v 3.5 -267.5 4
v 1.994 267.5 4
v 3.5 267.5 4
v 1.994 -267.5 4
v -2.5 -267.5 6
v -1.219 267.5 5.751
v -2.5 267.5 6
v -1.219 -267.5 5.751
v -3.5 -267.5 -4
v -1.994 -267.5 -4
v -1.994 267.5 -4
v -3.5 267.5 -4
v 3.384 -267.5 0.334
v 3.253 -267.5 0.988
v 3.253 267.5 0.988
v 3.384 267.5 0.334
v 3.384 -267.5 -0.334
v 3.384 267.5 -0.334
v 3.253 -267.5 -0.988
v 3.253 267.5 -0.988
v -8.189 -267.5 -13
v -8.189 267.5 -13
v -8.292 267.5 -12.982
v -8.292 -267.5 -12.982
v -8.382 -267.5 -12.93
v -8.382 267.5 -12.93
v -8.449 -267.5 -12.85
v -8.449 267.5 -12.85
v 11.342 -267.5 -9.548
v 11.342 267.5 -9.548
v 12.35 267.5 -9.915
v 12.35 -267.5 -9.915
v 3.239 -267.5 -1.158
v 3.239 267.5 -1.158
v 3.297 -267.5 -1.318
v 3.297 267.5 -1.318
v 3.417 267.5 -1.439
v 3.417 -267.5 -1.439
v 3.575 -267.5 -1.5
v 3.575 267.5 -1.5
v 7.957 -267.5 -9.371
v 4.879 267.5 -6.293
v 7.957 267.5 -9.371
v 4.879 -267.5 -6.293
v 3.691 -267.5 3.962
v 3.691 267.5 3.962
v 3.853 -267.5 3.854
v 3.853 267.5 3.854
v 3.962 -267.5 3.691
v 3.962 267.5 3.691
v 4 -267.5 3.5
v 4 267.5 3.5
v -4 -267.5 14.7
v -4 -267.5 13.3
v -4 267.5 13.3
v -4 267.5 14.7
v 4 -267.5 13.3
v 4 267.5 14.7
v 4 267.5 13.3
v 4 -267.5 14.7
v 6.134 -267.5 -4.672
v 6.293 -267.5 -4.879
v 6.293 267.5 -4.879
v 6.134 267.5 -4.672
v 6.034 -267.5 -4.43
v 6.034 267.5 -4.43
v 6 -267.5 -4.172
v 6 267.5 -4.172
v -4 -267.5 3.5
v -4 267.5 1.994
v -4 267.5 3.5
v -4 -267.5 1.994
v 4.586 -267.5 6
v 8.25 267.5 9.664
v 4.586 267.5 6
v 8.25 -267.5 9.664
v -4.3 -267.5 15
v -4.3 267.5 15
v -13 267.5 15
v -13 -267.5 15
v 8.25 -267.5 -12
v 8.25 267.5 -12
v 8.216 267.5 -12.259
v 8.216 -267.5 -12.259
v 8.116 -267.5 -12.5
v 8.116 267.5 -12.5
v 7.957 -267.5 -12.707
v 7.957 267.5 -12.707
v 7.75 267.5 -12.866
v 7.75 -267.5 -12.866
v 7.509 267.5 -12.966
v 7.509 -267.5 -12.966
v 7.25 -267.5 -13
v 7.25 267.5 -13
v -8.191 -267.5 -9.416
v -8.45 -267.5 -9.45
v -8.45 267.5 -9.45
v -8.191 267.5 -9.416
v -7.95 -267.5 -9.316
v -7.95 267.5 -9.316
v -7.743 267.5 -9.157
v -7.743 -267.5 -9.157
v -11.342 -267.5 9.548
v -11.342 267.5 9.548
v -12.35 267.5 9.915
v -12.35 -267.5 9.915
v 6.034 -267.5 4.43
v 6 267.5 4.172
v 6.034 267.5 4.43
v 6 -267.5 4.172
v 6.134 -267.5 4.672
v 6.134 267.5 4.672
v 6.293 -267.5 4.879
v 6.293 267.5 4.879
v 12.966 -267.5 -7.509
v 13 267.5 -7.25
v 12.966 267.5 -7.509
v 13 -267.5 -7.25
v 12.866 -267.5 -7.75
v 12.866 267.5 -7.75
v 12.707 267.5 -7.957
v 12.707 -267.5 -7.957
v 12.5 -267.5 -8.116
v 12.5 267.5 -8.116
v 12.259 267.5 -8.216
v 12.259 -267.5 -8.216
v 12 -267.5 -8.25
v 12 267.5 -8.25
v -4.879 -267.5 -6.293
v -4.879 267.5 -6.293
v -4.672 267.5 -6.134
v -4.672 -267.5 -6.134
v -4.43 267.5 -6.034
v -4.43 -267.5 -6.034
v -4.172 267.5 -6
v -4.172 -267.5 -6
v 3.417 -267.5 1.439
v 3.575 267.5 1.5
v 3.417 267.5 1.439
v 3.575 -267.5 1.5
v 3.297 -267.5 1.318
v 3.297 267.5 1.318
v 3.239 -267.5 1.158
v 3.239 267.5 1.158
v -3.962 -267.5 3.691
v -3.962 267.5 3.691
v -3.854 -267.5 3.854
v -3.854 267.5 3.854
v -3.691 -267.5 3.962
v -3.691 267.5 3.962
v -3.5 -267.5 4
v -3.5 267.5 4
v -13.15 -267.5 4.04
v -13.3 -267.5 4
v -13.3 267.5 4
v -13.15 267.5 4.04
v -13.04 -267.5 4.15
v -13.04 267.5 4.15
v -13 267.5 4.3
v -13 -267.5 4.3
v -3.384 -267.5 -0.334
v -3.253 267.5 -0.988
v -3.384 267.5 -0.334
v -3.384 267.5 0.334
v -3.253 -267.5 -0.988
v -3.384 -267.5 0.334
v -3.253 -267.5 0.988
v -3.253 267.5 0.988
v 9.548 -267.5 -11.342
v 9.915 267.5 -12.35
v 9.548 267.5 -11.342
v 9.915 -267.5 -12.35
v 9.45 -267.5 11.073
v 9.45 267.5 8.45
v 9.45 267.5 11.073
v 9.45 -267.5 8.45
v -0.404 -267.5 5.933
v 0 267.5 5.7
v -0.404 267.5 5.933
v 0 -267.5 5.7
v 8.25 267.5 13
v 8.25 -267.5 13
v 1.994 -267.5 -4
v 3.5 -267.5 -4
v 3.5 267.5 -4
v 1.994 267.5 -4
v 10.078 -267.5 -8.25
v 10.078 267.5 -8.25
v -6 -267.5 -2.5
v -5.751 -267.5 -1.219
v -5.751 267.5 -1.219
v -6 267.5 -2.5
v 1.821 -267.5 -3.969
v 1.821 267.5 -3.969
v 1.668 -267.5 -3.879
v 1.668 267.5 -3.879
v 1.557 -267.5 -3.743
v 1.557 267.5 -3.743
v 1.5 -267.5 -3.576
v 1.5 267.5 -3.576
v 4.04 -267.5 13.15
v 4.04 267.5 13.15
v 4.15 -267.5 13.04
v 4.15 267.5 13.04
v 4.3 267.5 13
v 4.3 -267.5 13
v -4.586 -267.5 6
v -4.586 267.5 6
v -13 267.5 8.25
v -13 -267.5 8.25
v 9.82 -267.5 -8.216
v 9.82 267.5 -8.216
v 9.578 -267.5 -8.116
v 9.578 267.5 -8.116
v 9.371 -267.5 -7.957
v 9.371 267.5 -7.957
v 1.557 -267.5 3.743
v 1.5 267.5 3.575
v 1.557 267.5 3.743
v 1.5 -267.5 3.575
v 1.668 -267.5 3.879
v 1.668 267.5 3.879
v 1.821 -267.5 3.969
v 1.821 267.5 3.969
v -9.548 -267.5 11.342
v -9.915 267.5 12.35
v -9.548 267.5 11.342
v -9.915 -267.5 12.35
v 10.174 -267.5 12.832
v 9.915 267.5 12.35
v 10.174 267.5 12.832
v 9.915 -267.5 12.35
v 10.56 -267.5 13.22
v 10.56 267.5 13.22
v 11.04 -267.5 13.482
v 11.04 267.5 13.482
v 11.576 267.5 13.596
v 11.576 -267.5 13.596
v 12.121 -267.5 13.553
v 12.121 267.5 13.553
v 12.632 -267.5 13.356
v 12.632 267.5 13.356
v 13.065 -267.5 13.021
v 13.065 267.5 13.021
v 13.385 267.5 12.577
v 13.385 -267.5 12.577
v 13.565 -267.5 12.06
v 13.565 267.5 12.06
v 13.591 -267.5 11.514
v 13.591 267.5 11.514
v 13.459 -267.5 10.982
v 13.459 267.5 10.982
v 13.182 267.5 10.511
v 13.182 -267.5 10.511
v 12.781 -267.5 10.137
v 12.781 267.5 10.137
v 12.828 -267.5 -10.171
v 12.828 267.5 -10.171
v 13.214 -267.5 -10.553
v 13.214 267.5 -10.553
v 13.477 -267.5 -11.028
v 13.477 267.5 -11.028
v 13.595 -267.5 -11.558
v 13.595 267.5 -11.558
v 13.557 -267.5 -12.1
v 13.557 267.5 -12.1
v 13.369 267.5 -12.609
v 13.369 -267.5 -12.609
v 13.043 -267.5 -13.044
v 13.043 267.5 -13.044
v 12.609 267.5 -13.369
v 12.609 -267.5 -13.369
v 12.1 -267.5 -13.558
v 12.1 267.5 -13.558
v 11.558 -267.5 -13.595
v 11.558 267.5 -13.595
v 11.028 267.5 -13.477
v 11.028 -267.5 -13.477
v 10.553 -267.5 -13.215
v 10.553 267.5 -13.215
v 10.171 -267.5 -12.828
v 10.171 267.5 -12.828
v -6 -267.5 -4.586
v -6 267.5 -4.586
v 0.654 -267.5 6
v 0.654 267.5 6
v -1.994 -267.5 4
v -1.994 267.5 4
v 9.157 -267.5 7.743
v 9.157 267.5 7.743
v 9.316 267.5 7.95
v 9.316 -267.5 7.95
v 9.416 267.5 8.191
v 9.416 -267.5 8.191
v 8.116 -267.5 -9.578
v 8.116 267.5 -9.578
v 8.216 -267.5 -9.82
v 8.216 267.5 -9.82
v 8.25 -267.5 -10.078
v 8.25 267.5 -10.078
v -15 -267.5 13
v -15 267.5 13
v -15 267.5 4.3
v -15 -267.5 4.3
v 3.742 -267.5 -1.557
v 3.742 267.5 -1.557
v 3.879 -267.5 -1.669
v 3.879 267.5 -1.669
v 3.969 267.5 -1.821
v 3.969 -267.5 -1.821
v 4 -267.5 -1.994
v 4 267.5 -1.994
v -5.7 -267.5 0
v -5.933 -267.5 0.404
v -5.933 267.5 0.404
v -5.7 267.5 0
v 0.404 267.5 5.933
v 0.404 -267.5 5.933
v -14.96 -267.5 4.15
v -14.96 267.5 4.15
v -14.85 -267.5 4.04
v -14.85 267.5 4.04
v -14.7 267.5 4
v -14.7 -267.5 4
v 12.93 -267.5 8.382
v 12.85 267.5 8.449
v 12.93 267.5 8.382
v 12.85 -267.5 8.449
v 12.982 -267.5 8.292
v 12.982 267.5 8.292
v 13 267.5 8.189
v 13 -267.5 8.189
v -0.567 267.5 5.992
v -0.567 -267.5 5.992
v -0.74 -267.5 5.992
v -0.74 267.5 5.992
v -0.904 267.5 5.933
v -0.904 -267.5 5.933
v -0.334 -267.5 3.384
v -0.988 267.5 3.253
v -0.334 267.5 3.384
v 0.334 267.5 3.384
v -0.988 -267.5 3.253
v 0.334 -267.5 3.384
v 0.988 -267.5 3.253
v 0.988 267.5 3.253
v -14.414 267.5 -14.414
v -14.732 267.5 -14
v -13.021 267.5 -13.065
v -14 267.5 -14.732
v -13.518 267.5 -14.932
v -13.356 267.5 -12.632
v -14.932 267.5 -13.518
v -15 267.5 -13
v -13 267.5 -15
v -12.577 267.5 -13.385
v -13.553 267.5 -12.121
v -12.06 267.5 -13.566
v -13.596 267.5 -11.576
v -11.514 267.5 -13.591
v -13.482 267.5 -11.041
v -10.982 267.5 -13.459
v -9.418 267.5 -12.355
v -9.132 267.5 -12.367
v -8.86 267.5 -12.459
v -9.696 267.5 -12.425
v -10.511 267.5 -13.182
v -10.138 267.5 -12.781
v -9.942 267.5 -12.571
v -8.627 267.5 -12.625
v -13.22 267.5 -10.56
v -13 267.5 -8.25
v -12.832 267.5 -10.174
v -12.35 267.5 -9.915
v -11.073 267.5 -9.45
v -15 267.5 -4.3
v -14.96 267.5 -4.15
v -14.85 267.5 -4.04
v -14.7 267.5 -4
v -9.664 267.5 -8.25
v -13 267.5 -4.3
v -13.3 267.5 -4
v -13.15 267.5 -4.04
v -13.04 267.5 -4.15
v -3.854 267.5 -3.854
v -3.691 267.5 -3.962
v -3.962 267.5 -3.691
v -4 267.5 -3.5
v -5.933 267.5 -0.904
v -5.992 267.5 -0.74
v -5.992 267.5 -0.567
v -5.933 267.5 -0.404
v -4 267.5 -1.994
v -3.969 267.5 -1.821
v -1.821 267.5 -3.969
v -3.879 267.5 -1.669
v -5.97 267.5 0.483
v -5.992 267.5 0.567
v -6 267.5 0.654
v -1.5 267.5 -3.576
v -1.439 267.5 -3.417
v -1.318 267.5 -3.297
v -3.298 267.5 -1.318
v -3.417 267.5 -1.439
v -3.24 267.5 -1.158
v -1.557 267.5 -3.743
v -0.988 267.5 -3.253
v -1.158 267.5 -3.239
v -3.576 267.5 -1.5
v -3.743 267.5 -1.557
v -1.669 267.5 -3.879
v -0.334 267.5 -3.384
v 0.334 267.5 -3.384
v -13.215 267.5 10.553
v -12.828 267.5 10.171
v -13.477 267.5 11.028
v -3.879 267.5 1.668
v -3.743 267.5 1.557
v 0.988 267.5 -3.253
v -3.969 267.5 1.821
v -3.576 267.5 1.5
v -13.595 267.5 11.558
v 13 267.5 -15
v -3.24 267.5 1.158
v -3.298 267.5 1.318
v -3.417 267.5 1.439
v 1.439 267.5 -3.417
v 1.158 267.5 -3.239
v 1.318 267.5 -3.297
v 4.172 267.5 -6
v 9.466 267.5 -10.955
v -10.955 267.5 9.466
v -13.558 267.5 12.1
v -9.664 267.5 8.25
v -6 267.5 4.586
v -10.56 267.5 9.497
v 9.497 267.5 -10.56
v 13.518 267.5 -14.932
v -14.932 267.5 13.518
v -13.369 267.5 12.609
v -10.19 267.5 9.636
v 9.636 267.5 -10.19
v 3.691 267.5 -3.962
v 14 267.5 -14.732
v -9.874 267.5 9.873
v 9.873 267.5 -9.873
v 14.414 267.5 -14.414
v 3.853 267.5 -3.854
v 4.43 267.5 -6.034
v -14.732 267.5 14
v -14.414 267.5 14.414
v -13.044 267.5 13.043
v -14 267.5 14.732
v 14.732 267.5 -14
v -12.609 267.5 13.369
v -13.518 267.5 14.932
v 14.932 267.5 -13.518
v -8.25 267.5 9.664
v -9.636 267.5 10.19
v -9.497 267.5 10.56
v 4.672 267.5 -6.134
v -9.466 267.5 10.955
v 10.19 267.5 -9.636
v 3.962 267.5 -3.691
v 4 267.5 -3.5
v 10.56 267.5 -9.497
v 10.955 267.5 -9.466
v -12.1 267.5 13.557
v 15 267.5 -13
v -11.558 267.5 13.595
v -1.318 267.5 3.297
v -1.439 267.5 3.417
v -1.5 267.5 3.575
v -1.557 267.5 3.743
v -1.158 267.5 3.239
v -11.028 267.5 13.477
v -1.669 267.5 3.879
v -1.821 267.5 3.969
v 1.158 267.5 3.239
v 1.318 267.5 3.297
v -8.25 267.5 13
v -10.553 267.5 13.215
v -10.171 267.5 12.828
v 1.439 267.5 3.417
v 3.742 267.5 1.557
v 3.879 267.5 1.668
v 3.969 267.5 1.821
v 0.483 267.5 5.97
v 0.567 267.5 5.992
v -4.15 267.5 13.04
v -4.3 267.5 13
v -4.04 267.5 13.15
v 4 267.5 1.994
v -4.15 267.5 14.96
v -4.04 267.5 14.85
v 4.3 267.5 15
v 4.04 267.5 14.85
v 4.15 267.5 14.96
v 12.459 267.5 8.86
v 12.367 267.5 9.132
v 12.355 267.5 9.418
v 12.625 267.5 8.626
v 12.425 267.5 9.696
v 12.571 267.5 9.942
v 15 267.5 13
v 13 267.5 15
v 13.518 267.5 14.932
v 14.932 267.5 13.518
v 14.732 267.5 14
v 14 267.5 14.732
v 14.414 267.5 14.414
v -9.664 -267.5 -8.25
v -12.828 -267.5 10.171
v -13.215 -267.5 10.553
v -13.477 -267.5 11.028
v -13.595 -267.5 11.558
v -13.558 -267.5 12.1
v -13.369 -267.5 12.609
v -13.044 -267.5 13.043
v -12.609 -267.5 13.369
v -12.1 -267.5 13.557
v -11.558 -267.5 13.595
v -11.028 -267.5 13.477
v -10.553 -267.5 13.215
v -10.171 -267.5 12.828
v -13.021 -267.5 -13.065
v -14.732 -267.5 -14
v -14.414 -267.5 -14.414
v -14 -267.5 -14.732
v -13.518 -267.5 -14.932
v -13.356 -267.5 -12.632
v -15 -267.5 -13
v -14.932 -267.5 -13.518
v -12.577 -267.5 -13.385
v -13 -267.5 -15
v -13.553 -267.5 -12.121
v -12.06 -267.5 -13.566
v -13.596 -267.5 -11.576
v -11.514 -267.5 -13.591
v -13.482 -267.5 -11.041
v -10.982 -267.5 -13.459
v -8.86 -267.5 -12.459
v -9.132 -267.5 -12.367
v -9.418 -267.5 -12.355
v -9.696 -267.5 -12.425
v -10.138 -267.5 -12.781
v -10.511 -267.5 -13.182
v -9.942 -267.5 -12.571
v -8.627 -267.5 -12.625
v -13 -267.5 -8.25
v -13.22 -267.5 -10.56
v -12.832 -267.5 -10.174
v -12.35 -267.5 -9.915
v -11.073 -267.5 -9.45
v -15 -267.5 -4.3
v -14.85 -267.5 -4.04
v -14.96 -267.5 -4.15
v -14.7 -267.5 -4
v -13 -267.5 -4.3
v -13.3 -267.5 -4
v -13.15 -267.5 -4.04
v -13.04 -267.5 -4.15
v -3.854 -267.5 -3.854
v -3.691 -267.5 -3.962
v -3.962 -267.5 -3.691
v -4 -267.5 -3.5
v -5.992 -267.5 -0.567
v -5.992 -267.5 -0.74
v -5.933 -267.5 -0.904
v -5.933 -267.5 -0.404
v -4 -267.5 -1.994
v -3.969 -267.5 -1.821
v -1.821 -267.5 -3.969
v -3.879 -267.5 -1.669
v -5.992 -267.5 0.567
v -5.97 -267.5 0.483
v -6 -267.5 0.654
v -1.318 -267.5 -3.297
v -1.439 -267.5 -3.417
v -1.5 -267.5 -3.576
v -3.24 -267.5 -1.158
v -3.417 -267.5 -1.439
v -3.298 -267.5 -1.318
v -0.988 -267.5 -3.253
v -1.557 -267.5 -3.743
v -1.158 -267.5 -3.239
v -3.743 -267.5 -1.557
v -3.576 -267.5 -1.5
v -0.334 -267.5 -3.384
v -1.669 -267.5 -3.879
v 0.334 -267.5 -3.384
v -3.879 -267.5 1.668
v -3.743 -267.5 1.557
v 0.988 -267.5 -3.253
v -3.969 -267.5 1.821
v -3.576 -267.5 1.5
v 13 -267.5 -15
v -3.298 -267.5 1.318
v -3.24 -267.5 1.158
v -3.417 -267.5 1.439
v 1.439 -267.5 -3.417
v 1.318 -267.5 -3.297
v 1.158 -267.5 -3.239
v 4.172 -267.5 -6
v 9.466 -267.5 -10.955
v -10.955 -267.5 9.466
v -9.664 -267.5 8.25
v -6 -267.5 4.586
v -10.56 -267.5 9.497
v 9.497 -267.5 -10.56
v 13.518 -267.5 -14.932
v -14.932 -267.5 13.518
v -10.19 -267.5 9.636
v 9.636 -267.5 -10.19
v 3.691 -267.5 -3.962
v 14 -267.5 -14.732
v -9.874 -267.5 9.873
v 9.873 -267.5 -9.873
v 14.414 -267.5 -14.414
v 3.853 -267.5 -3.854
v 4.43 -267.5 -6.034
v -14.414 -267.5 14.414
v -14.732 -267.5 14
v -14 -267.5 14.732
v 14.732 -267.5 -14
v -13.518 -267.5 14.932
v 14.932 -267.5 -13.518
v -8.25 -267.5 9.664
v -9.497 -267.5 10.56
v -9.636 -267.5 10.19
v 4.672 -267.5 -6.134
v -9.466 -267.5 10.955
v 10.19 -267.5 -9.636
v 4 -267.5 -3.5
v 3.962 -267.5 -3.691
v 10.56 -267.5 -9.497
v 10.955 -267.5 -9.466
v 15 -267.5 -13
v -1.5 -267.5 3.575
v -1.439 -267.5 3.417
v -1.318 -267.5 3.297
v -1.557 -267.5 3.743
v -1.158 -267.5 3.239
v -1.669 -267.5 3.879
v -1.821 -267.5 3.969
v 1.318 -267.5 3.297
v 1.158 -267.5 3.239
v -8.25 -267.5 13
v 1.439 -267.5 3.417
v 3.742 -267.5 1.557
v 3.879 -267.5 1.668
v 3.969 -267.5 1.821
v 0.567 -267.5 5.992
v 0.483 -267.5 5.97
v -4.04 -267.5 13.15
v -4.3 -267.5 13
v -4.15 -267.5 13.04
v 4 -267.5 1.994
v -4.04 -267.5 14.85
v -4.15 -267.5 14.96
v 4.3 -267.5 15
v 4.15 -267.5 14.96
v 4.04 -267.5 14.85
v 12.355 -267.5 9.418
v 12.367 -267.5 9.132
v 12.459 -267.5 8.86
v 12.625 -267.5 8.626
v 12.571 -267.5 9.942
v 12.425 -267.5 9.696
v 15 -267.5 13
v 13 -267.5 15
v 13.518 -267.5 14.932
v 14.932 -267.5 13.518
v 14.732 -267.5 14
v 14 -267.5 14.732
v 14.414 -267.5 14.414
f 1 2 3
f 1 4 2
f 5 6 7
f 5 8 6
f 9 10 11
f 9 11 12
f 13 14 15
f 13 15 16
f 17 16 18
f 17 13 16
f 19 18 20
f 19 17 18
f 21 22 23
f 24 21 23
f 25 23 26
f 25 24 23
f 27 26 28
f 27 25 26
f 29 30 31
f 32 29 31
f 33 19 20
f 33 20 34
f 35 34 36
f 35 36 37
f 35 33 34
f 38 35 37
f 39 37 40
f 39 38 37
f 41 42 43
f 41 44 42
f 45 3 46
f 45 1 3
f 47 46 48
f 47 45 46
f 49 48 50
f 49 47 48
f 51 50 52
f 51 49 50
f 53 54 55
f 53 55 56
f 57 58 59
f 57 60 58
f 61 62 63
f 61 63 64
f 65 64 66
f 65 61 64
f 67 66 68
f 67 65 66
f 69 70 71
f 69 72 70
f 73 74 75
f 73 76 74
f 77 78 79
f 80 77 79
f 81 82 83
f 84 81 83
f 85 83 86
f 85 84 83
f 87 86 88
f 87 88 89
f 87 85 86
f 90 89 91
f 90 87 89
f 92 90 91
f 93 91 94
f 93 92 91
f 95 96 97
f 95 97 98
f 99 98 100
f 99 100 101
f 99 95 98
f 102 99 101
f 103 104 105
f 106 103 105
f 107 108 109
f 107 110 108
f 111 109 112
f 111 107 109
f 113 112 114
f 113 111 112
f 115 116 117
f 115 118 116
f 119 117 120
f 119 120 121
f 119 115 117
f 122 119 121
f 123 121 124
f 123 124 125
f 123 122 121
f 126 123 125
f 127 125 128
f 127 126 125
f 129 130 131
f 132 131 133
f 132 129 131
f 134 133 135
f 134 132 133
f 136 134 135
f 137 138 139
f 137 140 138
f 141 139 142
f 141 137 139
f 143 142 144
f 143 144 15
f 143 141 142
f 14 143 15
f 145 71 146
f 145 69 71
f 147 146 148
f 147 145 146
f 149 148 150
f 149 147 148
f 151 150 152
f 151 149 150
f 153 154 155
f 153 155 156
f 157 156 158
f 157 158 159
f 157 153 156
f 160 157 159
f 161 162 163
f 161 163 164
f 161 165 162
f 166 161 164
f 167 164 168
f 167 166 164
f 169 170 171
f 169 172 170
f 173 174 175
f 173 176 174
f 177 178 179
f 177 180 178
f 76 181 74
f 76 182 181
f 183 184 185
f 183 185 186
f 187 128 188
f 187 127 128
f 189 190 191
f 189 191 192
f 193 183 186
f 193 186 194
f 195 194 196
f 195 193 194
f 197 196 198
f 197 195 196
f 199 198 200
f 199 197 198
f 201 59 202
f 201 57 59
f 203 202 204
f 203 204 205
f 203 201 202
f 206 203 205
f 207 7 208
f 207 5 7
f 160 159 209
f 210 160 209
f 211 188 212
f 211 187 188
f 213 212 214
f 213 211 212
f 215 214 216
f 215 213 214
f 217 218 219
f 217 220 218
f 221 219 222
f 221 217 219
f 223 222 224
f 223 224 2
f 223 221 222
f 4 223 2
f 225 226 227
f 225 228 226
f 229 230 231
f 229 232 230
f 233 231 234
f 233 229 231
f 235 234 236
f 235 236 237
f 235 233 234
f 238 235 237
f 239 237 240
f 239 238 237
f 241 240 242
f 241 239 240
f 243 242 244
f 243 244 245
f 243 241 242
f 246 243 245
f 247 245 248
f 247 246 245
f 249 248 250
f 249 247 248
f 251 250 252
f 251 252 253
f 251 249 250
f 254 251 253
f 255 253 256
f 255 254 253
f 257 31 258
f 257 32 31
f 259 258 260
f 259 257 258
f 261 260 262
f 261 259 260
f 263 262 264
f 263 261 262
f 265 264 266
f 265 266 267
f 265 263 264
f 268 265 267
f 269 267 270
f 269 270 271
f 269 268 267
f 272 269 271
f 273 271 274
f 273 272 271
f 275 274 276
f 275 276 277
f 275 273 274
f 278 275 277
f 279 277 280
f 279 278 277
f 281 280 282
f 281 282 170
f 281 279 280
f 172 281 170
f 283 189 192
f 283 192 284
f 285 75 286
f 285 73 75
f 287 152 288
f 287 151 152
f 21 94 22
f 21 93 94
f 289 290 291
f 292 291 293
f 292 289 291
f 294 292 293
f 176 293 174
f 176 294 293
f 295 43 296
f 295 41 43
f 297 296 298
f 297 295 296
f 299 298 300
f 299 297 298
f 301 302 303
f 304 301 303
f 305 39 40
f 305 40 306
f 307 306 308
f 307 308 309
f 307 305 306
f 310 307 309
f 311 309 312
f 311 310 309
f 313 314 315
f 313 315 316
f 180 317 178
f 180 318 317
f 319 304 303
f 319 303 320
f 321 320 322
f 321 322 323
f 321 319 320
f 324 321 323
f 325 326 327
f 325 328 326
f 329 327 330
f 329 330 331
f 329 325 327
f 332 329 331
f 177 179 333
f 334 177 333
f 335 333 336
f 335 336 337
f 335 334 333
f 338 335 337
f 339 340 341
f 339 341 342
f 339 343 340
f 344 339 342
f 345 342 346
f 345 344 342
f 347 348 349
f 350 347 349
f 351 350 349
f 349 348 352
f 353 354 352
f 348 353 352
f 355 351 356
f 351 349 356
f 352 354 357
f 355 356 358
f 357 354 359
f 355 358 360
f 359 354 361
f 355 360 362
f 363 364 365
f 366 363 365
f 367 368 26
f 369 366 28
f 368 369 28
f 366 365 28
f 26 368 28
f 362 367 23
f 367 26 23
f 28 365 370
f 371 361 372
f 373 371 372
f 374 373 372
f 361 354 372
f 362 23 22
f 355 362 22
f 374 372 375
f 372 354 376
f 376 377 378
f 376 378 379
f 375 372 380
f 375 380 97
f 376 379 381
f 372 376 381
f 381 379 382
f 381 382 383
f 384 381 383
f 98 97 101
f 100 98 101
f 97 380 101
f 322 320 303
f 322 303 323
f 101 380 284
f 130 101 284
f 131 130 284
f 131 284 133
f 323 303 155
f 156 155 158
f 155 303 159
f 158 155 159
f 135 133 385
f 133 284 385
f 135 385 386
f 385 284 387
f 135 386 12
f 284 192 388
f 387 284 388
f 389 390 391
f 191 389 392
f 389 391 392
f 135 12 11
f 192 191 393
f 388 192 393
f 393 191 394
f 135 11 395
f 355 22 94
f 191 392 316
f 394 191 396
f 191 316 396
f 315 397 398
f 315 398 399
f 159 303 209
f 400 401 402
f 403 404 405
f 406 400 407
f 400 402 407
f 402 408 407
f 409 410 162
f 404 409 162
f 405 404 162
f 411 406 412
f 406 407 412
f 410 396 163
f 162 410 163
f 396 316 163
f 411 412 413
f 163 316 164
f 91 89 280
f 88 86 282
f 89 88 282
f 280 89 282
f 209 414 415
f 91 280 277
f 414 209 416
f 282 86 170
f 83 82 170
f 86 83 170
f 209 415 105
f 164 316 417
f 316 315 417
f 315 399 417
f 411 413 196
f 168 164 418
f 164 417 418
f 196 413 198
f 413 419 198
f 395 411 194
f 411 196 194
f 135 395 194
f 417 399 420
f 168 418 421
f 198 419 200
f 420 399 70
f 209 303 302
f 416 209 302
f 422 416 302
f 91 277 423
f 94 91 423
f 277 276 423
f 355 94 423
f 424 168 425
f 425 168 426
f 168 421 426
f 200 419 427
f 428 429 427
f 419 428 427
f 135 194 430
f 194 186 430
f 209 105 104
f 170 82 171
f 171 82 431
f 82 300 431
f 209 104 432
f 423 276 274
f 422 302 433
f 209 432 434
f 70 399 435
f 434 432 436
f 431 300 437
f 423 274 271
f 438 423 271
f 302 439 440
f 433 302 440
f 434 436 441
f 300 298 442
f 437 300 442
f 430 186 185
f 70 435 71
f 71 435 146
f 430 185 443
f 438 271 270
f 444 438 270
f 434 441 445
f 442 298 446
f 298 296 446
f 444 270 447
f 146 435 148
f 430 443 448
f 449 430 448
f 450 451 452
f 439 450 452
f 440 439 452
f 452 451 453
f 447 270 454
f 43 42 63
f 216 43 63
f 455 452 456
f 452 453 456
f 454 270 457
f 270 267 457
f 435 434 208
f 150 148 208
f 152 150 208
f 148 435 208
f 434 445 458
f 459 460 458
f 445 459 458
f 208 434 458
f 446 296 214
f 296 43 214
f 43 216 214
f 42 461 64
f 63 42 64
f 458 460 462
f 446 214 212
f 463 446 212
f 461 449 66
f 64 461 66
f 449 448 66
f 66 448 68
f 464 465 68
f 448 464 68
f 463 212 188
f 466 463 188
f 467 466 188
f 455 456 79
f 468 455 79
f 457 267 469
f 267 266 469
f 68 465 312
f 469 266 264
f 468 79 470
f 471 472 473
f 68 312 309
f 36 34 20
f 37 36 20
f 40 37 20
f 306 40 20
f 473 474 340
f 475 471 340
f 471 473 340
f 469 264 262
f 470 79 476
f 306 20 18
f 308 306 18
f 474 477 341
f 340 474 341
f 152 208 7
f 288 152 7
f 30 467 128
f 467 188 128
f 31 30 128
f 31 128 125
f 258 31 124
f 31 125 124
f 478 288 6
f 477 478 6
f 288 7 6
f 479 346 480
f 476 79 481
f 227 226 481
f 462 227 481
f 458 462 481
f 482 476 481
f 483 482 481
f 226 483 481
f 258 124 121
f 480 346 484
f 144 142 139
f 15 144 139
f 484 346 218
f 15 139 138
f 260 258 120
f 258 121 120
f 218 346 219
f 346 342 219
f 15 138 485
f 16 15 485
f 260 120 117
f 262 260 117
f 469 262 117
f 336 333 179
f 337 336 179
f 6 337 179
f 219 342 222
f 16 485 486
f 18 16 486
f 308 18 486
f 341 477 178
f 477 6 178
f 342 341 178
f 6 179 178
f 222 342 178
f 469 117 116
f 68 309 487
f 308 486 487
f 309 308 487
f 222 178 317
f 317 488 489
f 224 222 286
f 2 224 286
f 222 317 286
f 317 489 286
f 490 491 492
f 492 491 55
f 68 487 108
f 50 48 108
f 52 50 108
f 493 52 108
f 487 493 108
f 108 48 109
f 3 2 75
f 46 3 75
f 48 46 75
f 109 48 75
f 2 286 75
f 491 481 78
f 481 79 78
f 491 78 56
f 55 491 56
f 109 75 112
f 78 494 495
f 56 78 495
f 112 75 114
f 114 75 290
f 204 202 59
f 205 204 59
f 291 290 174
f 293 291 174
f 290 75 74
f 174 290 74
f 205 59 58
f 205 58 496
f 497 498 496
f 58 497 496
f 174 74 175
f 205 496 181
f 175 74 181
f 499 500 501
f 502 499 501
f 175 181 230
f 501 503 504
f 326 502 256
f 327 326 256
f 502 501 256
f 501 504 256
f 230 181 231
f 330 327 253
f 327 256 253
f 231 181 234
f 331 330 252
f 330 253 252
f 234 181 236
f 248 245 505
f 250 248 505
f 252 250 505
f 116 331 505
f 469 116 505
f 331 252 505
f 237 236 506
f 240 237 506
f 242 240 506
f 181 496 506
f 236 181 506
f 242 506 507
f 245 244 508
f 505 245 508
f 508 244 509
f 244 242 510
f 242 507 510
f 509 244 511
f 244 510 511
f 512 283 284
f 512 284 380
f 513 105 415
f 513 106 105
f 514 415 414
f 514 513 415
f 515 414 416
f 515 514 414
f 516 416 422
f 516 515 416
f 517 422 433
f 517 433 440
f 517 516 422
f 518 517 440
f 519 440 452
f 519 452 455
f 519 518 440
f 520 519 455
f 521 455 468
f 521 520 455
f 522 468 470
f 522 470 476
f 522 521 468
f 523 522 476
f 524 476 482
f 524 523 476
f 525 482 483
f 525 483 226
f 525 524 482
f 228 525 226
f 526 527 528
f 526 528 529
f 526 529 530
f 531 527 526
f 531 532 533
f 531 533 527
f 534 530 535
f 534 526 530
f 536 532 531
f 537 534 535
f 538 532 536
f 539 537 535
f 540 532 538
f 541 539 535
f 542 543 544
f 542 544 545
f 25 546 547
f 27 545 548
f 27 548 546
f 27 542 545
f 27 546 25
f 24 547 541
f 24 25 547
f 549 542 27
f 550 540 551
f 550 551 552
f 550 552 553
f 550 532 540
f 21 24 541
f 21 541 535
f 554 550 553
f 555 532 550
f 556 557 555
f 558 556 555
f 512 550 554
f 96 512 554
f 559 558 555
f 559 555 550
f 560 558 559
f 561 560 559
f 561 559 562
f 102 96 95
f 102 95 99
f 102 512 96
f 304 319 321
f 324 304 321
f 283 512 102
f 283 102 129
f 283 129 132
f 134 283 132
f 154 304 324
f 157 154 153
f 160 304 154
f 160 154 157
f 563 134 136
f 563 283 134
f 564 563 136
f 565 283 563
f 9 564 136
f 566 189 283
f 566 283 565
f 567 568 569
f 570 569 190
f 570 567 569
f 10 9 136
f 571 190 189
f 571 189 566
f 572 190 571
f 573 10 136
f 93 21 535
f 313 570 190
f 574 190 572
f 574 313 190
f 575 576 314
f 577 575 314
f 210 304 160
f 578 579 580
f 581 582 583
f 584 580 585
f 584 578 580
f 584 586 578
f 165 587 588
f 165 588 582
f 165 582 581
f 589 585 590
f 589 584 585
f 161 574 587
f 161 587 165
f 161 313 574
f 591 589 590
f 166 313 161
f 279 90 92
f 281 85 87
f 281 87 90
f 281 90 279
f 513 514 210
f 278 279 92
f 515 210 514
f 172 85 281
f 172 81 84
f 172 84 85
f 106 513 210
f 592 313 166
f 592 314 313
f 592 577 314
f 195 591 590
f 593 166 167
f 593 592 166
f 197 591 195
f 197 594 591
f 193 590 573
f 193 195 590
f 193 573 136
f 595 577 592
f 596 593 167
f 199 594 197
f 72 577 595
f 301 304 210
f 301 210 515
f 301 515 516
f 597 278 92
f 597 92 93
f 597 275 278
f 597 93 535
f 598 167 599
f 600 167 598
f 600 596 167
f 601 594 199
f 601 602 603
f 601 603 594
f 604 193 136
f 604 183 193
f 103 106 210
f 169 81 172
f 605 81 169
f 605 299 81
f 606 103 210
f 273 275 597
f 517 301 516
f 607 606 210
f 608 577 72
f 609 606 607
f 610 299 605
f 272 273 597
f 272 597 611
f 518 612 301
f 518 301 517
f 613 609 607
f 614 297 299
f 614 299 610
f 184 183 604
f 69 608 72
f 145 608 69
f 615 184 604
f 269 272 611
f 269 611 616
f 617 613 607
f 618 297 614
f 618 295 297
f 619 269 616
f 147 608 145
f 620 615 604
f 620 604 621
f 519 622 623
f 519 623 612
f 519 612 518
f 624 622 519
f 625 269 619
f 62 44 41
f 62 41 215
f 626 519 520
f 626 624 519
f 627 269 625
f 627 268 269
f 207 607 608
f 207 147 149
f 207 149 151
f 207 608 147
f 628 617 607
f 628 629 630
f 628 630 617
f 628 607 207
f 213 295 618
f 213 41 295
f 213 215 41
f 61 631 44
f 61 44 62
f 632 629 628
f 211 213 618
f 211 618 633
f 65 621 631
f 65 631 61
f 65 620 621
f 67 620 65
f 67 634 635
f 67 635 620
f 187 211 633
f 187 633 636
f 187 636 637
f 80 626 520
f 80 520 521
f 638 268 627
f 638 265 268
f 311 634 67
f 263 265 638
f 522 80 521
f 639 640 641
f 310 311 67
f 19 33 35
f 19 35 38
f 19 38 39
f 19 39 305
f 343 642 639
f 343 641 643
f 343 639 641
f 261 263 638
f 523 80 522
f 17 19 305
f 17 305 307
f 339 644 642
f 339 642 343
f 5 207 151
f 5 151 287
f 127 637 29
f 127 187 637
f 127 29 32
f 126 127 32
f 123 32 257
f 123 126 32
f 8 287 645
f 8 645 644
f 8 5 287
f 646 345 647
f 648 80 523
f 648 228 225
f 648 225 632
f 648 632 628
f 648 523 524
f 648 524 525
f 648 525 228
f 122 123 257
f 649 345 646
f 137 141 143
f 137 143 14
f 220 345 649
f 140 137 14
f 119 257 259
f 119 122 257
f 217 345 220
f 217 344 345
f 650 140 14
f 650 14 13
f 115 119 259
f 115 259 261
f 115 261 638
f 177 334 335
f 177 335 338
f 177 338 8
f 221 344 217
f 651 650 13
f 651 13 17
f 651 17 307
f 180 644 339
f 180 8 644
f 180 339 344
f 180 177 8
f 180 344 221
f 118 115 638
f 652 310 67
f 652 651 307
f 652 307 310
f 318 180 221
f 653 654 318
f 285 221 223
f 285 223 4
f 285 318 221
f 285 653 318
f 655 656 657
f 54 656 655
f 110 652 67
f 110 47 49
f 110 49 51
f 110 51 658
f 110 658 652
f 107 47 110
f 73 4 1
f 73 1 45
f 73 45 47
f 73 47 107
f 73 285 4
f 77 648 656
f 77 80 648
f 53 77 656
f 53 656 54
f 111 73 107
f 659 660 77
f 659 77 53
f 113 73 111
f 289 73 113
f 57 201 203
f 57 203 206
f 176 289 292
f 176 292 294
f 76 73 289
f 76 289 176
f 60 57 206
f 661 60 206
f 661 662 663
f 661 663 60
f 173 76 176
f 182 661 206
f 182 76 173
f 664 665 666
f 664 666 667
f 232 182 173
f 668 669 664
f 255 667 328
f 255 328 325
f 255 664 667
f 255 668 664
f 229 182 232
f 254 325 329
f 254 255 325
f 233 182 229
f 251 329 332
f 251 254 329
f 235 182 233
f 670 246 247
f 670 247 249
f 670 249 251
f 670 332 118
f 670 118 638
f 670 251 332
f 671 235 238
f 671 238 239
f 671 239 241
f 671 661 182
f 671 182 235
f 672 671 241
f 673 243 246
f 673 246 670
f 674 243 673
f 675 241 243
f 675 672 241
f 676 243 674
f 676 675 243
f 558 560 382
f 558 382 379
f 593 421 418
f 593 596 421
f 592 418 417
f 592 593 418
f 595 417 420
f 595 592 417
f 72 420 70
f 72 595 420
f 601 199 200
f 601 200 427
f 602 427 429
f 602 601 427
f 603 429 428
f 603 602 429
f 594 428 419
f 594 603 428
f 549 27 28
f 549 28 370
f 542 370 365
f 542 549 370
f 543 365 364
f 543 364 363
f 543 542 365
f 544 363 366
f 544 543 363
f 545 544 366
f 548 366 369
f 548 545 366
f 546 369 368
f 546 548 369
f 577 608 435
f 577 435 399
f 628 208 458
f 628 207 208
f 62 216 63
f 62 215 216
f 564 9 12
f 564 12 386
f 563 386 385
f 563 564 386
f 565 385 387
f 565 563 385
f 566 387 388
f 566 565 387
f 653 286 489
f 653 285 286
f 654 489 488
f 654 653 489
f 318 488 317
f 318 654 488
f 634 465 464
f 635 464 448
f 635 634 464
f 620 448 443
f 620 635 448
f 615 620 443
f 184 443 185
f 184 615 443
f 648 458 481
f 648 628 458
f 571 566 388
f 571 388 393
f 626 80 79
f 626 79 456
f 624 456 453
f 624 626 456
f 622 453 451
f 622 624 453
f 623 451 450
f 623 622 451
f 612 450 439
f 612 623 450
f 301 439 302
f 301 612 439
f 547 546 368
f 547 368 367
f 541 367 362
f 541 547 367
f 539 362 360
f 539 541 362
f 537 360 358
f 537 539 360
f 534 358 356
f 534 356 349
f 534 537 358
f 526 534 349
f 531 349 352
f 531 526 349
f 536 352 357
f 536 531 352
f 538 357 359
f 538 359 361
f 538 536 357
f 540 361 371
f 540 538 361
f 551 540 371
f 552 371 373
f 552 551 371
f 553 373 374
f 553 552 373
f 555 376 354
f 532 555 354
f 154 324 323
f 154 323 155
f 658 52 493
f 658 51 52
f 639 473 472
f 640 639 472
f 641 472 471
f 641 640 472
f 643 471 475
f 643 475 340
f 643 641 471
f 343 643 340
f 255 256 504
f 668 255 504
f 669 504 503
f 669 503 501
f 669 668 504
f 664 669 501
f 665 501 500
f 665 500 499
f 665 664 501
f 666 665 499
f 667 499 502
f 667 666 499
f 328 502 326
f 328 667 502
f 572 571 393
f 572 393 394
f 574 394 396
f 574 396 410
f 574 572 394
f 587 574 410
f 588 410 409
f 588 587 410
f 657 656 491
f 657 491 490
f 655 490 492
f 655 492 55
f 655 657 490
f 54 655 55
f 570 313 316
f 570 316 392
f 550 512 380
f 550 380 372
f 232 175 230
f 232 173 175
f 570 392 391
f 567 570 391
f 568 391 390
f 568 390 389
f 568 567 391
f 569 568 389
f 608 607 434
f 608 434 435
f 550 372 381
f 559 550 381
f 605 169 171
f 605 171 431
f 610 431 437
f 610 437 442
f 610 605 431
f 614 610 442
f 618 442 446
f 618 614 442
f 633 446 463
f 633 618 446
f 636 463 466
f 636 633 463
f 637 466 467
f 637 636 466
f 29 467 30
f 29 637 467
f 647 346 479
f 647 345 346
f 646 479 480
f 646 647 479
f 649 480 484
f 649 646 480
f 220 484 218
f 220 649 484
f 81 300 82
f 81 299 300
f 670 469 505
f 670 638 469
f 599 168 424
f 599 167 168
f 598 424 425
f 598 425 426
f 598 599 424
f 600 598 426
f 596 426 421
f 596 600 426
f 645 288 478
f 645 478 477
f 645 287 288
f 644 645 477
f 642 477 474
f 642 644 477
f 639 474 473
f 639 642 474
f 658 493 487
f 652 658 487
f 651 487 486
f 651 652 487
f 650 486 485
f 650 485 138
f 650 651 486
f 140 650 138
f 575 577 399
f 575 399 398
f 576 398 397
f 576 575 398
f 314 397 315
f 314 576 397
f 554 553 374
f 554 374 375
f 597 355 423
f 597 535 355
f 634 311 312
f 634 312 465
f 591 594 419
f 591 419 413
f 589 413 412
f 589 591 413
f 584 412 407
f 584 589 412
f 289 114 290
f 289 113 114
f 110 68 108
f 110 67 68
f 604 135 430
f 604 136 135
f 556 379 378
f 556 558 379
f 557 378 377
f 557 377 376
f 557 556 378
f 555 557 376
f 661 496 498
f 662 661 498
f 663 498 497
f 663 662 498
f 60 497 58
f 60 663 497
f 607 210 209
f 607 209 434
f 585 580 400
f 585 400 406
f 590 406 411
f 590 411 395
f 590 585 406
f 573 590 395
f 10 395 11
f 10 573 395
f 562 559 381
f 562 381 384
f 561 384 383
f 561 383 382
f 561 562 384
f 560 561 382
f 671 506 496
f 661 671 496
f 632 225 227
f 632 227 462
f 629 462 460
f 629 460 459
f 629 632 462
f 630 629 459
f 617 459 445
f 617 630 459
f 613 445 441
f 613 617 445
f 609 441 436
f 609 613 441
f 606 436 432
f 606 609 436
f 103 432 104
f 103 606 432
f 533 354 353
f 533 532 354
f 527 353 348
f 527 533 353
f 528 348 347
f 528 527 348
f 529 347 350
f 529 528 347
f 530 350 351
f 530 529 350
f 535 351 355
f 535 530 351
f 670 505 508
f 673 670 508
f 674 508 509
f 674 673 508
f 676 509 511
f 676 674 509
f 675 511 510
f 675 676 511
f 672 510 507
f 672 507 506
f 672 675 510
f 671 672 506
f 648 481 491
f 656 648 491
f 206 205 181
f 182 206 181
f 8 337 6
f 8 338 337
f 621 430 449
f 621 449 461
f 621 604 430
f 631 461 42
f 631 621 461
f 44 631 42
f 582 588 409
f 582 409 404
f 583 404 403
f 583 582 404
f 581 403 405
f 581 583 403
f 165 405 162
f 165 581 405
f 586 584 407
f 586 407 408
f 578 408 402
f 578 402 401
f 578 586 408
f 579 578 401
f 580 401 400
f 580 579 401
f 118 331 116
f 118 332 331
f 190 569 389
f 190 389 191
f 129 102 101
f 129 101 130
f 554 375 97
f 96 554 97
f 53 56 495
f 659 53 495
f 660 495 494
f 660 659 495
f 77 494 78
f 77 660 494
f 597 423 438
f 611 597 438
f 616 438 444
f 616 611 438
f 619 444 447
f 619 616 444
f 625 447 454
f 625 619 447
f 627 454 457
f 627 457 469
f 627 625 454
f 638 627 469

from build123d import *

# Parameters (mm, degrees)
F2_DEPTH = 267.5


# Not quite as in the source:
# - ends of sketch curves that miss each other by under 0.0002 mm in the source are joined


with BuildPart() as f2:
    # F1 (on Front) → F2 (new body, symmetric)
    with BuildSketch(Plane.XZ):
        with BuildLine():
            Line((-8.250056, 12.999986), (-4.300056, 12.999986))
            ThreePointArc((-4.300056, 12.999986), (-4.0879239656, 13.0878539656), (-4.000056, 13.299986))
            Line((-4.000056, 13.299986), (-4.000056, 14.699986))
            ThreePointArc((-4.000056, 14.699986), (-4.0879239656, 14.9121180344), (-4.300056, 14.999986))
            Line((-4.300056, 14.999986), (-13.000056, 14.999986))
            ThreePointArc((-13.000056, 14.999986), (-14.4142695624, 14.4141995624), (-15.000056, 12.999986))
            Line((-15.000056, 12.999986), (-15.000056, 4.299986))
            ThreePointArc((-15.000056, 4.299986), (-14.9121880344, 4.0878539656), (-14.700056, 3.999986))
            Line((-14.700056, 3.999986), (-13.300056, 3.999986))
            ThreePointArc((-13.300056, 3.999986), (-13.0879239656, 4.0878539656), (-13.000056, 4.299986))
            Line((-13.000056, 4.299986), (-13.000056, 8.249986))
            Line((-13.000056, 8.249986), (-9.66427, 8.249986))
            Line((-9.66427, 8.249986), (-6.000056, 4.585772))
            Line((-6.000056, 4.585772), (-6.000056, 0.653576))
            ThreePointArc((-6.000056, 0.653576), (-5.9830189324, 0.5241665494), (-5.9330687764, 0.4035761291))
            Line((-5.9330687764, 0.4035761291), (-5.700056, -1.4e-05))
            Line((-5.700056, -1.4e-05), (-5.933069, -0.403604))
            ThreePointArc((-5.933069, -0.403604), (-6.000056, -0.653604), (-5.9330687764, -0.9036038709))
            Line((-5.9330687764, -0.9036038709), (-5.751033, -1.2189))
            Line((-5.751033, -1.2189), (-6.000056, -2.500014))
            Line((-6.000056, -2.500014), (-6.000056, -4.5858))
            Line((-6.000056, -4.5858), (-9.66427, -8.250014))
            Line((-9.66427, -8.250014), (-13.000056, -8.250014))
            Line((-13.000056, -8.250014), (-13.000056, -4.300014))
            ThreePointArc((-13.000056, -4.300014), (-13.0879239656, -4.0878819656), (-13.300056, -4.000014))
            Line((-13.300056, -4.000014), (-14.700056, -4.000014))
            ThreePointArc((-14.700056, -4.000014), (-14.9121880344, -4.0878819656), (-15.000056, -4.300014))
            Line((-15.000056, -4.300014), (-15.000056, -13.000014))
            ThreePointArc((-15.000056, -13.000014), (-14.4142695624, -14.4142275624), (-13.000056, -15.000014))
            Line((-13.000056, -15.000014), (12.999944, -15.000014))
            ThreePointArc((12.999944, -15.000014), (14.4141575624, -14.4142275624), (14.999944, -13.000014))
            Line((14.999944, -13.000014), (14.999944, 12.999986))
            ThreePointArc((14.999944, 12.999986), (14.4141575624, 14.4141995624), (12.999944, 14.999986))
            Line((12.999944, 14.999986), (4.299944, 14.999986))
            ThreePointArc((4.299944, 14.999986), (4.0878119656, 14.9121180344), (3.999944, 14.699986))
            Line((3.999944, 14.699986), (3.999944, 13.299986))
            ThreePointArc((3.999944, 13.299986), (4.0878119656, 13.0878539656), (4.299944, 12.999986))
            Line((4.299944, 12.999986), (8.249944, 12.999986))
            Line((8.249944, 12.999986), (8.249944, 9.6642))
            Line((8.249944, 9.6642), (4.58573, 5.999986))
            Line((4.58573, 5.999986), (0.653534, 5.999986))
            ThreePointArc((0.653534, 5.999986), (0.5241245494, 5.9829489324), (0.4035341291, 5.9329987764))
            Line((0.4035341291, 5.9329987764), (-5.6e-05, 5.699986))
            Line((-5.6e-05, 5.699986), (-0.403646, 5.932999))
            ThreePointArc((-0.403646, 5.932999), (-0.653646, 5.999986), (-0.9036458709, 5.9329987764))
            Line((-0.9036458709, 5.9329987764), (-1.218942, 5.750963))
            Line((-1.218942, 5.750963), (-2.500056, 5.999986))
            Line((-2.500056, 5.999986), (-4.585842, 5.999986))
            Line((-4.585842, 5.999986), (-8.250056, 9.6642))
            Line((-8.250056, 9.6642), (-8.250056, 12.999986))
        make_face()
        with BuildLine():
            ThreePointArc((-8.189375, -13.000014), (-8.339375082, -12.9598215738), (-8.4491827159, -12.8500138359))
            ThreePointArc((-8.4491827159, -12.8500138359), (-9.2743948384, -12.3508472042), (-10.1375690315, -12.7810479782))
            ThreePointArc((-10.1375690315, -12.7810479782), (-13.2041723505, -12.8608903949), (-12.3498940253, -9.9145979306))
            Line((-12.3498940253, -9.9145979306), (-11.07346, -9.450014))
            Line((-11.07346, -9.450014), (-8.450056, -9.450014))
            ThreePointArc((-8.450056, -9.450014), (-8.0673725676, -9.3738935325), (-7.7429492188, -9.1571207812))
            Line((-7.7429492188, -9.1571207812), (-4.878736, -6.292907))
            ThreePointArc((-4.878736, -6.292907), (-4.5543124324, -6.0761344675), (-4.171629, -6.000014))
            Line((-4.171629, -6.000014), (4.171517, -6.000014))
            ThreePointArc((4.171517, -6.000014), (4.5542004324, -6.0761344675), (4.8786237812, -6.2929072188))
            Line((4.8786237812, -6.2929072188), (7.957051, -9.371334))
            ThreePointArc((7.957051, -9.371334), (8.1738235325, -9.6957575676), (8.249944, -10.078441))
            Line((8.249944, -10.078441), (8.249944, -12.000014))
            ThreePointArc((8.249944, -12.000014), (7.9570507812, -12.7071207812), (7.249944, -13.000014))
            Line((7.249944, -13.000014), (-8.189375, -13.000014))
        make_face(mode=Mode.SUBTRACT)
        with BuildLine():
            ThreePointArc((9.5477956661, -11.3422641215), (9.8734155063, -9.8734855063), (11.3421941215, -9.5478656661))
            Line((11.3421941215, -9.5478656661), (12.349782, -9.914598))
            ThreePointArc((12.349782, -9.914598), (13.0434468843, -13.0435168843), (9.9145279306, -12.3498520253))
            Line((9.9145279306, -12.3498520253), (9.5477956661, -11.3422641215))
        make_face(mode=Mode.SUBTRACT)
        with BuildLine():
            ThreePointArc((-9.5479076661, 11.3422361215), (-9.8735275063, 9.8734575063), (-11.3423061215, 9.5478376661))
            Line((-11.3423061215, 9.5478376661), (-12.349894, 9.91457))
            ThreePointArc((-12.349894, 9.91457), (-13.0435588843, 13.0434888843), (-9.9146399306, 12.3498240253))
            Line((-9.9146399306, 12.3498240253), (-9.5479076661, 11.3422361215))
        make_face(mode=Mode.SUBTRACT)
        with BuildLine():
            ThreePointArc((3.2531309855, 0.9883049956), (3.399944, -1.4e-05), (3.2531309855, -0.9883329956))
            ThreePointArc((3.2531309855, -0.9883329956), (3.2974111593, -1.3177976431), (3.5754529349, -1.5000144258))
            ThreePointArc((3.5754529349, -1.5000144258), (3.8792555231, -1.6685151025), (3.999944, -1.99428))
            Line((3.999944, -1.99428), (3.999944, -3.500014))
            ThreePointArc((3.999944, -3.500014), (3.8534973906, -3.8535673906), (3.499944, -4.000014))
            Line((3.499944, -4.000014), (1.99421, -4.000014))
            ThreePointArc((1.99421, -4.000014), (1.6684451025, -3.8793255231), (1.4999444822, -3.5755229263))
            ThreePointArc((1.4999444822, -3.5755229263), (1.3177276431, -3.2974811593), (0.9882590481, -3.2532021585))
            ThreePointArc((0.9882590481, -3.2532021585), (-5.6e-05, -3.400014), (-0.9883749956, -3.2532009855))
            ThreePointArc((-0.9883749956, -3.2532009855), (-1.3178396431, -3.2974811593), (-1.5000564258, -3.5755229349))
            ThreePointArc((-1.5000564258, -3.5755229349), (-1.6685571025, -3.8793255231), (-1.994322, -4.000014))
            Line((-1.994322, -4.000014), (-3.500056, -4.000014))
            ThreePointArc((-3.500056, -4.000014), (-3.8536093906, -3.8535673906), (-4.000056, -3.500014))
            Line((-4.000056, -3.500014), (-4.000056, -1.99428))
            ThreePointArc((-4.000056, -1.99428), (-3.8793675231, -1.6685151025), (-3.5755649263, -1.5000144822))
            ThreePointArc((-3.5755649263, -1.5000144822), (-3.2975231593, -1.3177976431), (-3.2532441585, -0.9883290481))
            ThreePointArc((-3.2532441585, -0.9883290481), (-3.400056, -1.4e-05), (-3.2532429855, 0.9883049956))
            ThreePointArc((-3.2532429855, 0.9883049956), (-3.2975231593, 1.3177696431), (-3.5755649349, 1.4999864258))
            ThreePointArc((-3.5755649349, 1.4999864258), (-3.8793675231, 1.6684871025), (-4.000056, 1.994252))
            Line((-4.000056, 1.994252), (-4.000056, 3.499986))
            ThreePointArc((-4.000056, 3.499986), (-3.8536093906, 3.8535393906), (-3.500056, 3.999986))
            Line((-3.500056, 3.999986), (-1.994322, 3.999986))
            ThreePointArc((-1.994322, 3.999986), (-1.6685571025, 3.8792975231), (-1.5000564822, 3.5754949263))
            ThreePointArc((-1.5000564822, 3.5754949263), (-1.3178396431, 3.2974531593), (-0.9883710481, 3.2531741585))
            ThreePointArc((-0.9883710481, 3.2531741585), (-5.6e-05, 3.399986), (0.9882629956, 3.2531729855))
            ThreePointArc((0.9882629956, 3.2531729855), (1.3177276431, 3.2974531593), (1.4999444258, 3.5754949349))
            ThreePointArc((1.4999444258, 3.5754949349), (1.6684451025, 3.8792975231), (1.99421, 3.999986))
            Line((1.99421, 3.999986), (3.499944, 3.999986))
            ThreePointArc((3.499944, 3.999986), (3.8534973906, 3.8535393906), (3.999944, 3.499986))
            Line((3.999944, 3.499986), (3.999944, 1.994252))
            ThreePointArc((3.999944, 1.994252), (3.8792555231, 1.6684871025), (3.5754529263, 1.4999864822))
            ThreePointArc((3.5754529263, 1.4999864822), (3.2974111593, 1.3177696431), (3.2531309855, 0.9883049956))
        make_face(mode=Mode.SUBTRACT)
        with BuildLine():
            ThreePointArc((6.2928372188, -4.8786937812), (6.0760644675, -4.5542704324), (5.999944, -4.171587))
            Line((5.999944, -4.171587), (5.999944, 4.171559))
            ThreePointArc((5.999944, 4.171559), (6.0760644675, 4.5542424324), (6.2928372188, 4.8786657812))
            Line((6.2928372188, 4.8786657812), (9.157051, 7.742879))
            ThreePointArc((9.157051, 7.742879), (9.3738235325, 8.0673025676), (9.449944, 8.449986))
            Line((9.449944, 8.449986), (9.449944, 11.07339))
            Line((9.449944, 11.07339), (9.914528, 12.349824))
            ThreePointArc((9.914528, 12.349824), (12.8608203949, 13.2041023505), (12.7809779799, 10.1374990291))
            ThreePointArc((12.7809779799, 10.1374990291), (12.3507772042, 9.2743248384), (12.8499438252, 8.4491126972))
            ThreePointArc((12.8499438252, 8.4491126972), (12.9597515738, 8.339305082), (12.999944, 8.189305))
            Line((12.999944, 8.189305), (12.999944, -7.250014))
            ThreePointArc((12.999944, -7.250014), (12.7070507812, -7.9571207812), (11.999944, -8.250014))
            Line((11.999944, -8.250014), (10.078371, -8.250014))
            ThreePointArc((10.078371, -8.250014), (9.6956875676, -8.1738935325), (9.3712642188, -7.9571207812))
            Line((9.3712642188, -7.9571207812), (6.2928372188, -4.8786937812))
        make_face(mode=Mode.SUBTRACT)
    extrude(amount=F2_DEPTH, both=True)


solid = f2.part
